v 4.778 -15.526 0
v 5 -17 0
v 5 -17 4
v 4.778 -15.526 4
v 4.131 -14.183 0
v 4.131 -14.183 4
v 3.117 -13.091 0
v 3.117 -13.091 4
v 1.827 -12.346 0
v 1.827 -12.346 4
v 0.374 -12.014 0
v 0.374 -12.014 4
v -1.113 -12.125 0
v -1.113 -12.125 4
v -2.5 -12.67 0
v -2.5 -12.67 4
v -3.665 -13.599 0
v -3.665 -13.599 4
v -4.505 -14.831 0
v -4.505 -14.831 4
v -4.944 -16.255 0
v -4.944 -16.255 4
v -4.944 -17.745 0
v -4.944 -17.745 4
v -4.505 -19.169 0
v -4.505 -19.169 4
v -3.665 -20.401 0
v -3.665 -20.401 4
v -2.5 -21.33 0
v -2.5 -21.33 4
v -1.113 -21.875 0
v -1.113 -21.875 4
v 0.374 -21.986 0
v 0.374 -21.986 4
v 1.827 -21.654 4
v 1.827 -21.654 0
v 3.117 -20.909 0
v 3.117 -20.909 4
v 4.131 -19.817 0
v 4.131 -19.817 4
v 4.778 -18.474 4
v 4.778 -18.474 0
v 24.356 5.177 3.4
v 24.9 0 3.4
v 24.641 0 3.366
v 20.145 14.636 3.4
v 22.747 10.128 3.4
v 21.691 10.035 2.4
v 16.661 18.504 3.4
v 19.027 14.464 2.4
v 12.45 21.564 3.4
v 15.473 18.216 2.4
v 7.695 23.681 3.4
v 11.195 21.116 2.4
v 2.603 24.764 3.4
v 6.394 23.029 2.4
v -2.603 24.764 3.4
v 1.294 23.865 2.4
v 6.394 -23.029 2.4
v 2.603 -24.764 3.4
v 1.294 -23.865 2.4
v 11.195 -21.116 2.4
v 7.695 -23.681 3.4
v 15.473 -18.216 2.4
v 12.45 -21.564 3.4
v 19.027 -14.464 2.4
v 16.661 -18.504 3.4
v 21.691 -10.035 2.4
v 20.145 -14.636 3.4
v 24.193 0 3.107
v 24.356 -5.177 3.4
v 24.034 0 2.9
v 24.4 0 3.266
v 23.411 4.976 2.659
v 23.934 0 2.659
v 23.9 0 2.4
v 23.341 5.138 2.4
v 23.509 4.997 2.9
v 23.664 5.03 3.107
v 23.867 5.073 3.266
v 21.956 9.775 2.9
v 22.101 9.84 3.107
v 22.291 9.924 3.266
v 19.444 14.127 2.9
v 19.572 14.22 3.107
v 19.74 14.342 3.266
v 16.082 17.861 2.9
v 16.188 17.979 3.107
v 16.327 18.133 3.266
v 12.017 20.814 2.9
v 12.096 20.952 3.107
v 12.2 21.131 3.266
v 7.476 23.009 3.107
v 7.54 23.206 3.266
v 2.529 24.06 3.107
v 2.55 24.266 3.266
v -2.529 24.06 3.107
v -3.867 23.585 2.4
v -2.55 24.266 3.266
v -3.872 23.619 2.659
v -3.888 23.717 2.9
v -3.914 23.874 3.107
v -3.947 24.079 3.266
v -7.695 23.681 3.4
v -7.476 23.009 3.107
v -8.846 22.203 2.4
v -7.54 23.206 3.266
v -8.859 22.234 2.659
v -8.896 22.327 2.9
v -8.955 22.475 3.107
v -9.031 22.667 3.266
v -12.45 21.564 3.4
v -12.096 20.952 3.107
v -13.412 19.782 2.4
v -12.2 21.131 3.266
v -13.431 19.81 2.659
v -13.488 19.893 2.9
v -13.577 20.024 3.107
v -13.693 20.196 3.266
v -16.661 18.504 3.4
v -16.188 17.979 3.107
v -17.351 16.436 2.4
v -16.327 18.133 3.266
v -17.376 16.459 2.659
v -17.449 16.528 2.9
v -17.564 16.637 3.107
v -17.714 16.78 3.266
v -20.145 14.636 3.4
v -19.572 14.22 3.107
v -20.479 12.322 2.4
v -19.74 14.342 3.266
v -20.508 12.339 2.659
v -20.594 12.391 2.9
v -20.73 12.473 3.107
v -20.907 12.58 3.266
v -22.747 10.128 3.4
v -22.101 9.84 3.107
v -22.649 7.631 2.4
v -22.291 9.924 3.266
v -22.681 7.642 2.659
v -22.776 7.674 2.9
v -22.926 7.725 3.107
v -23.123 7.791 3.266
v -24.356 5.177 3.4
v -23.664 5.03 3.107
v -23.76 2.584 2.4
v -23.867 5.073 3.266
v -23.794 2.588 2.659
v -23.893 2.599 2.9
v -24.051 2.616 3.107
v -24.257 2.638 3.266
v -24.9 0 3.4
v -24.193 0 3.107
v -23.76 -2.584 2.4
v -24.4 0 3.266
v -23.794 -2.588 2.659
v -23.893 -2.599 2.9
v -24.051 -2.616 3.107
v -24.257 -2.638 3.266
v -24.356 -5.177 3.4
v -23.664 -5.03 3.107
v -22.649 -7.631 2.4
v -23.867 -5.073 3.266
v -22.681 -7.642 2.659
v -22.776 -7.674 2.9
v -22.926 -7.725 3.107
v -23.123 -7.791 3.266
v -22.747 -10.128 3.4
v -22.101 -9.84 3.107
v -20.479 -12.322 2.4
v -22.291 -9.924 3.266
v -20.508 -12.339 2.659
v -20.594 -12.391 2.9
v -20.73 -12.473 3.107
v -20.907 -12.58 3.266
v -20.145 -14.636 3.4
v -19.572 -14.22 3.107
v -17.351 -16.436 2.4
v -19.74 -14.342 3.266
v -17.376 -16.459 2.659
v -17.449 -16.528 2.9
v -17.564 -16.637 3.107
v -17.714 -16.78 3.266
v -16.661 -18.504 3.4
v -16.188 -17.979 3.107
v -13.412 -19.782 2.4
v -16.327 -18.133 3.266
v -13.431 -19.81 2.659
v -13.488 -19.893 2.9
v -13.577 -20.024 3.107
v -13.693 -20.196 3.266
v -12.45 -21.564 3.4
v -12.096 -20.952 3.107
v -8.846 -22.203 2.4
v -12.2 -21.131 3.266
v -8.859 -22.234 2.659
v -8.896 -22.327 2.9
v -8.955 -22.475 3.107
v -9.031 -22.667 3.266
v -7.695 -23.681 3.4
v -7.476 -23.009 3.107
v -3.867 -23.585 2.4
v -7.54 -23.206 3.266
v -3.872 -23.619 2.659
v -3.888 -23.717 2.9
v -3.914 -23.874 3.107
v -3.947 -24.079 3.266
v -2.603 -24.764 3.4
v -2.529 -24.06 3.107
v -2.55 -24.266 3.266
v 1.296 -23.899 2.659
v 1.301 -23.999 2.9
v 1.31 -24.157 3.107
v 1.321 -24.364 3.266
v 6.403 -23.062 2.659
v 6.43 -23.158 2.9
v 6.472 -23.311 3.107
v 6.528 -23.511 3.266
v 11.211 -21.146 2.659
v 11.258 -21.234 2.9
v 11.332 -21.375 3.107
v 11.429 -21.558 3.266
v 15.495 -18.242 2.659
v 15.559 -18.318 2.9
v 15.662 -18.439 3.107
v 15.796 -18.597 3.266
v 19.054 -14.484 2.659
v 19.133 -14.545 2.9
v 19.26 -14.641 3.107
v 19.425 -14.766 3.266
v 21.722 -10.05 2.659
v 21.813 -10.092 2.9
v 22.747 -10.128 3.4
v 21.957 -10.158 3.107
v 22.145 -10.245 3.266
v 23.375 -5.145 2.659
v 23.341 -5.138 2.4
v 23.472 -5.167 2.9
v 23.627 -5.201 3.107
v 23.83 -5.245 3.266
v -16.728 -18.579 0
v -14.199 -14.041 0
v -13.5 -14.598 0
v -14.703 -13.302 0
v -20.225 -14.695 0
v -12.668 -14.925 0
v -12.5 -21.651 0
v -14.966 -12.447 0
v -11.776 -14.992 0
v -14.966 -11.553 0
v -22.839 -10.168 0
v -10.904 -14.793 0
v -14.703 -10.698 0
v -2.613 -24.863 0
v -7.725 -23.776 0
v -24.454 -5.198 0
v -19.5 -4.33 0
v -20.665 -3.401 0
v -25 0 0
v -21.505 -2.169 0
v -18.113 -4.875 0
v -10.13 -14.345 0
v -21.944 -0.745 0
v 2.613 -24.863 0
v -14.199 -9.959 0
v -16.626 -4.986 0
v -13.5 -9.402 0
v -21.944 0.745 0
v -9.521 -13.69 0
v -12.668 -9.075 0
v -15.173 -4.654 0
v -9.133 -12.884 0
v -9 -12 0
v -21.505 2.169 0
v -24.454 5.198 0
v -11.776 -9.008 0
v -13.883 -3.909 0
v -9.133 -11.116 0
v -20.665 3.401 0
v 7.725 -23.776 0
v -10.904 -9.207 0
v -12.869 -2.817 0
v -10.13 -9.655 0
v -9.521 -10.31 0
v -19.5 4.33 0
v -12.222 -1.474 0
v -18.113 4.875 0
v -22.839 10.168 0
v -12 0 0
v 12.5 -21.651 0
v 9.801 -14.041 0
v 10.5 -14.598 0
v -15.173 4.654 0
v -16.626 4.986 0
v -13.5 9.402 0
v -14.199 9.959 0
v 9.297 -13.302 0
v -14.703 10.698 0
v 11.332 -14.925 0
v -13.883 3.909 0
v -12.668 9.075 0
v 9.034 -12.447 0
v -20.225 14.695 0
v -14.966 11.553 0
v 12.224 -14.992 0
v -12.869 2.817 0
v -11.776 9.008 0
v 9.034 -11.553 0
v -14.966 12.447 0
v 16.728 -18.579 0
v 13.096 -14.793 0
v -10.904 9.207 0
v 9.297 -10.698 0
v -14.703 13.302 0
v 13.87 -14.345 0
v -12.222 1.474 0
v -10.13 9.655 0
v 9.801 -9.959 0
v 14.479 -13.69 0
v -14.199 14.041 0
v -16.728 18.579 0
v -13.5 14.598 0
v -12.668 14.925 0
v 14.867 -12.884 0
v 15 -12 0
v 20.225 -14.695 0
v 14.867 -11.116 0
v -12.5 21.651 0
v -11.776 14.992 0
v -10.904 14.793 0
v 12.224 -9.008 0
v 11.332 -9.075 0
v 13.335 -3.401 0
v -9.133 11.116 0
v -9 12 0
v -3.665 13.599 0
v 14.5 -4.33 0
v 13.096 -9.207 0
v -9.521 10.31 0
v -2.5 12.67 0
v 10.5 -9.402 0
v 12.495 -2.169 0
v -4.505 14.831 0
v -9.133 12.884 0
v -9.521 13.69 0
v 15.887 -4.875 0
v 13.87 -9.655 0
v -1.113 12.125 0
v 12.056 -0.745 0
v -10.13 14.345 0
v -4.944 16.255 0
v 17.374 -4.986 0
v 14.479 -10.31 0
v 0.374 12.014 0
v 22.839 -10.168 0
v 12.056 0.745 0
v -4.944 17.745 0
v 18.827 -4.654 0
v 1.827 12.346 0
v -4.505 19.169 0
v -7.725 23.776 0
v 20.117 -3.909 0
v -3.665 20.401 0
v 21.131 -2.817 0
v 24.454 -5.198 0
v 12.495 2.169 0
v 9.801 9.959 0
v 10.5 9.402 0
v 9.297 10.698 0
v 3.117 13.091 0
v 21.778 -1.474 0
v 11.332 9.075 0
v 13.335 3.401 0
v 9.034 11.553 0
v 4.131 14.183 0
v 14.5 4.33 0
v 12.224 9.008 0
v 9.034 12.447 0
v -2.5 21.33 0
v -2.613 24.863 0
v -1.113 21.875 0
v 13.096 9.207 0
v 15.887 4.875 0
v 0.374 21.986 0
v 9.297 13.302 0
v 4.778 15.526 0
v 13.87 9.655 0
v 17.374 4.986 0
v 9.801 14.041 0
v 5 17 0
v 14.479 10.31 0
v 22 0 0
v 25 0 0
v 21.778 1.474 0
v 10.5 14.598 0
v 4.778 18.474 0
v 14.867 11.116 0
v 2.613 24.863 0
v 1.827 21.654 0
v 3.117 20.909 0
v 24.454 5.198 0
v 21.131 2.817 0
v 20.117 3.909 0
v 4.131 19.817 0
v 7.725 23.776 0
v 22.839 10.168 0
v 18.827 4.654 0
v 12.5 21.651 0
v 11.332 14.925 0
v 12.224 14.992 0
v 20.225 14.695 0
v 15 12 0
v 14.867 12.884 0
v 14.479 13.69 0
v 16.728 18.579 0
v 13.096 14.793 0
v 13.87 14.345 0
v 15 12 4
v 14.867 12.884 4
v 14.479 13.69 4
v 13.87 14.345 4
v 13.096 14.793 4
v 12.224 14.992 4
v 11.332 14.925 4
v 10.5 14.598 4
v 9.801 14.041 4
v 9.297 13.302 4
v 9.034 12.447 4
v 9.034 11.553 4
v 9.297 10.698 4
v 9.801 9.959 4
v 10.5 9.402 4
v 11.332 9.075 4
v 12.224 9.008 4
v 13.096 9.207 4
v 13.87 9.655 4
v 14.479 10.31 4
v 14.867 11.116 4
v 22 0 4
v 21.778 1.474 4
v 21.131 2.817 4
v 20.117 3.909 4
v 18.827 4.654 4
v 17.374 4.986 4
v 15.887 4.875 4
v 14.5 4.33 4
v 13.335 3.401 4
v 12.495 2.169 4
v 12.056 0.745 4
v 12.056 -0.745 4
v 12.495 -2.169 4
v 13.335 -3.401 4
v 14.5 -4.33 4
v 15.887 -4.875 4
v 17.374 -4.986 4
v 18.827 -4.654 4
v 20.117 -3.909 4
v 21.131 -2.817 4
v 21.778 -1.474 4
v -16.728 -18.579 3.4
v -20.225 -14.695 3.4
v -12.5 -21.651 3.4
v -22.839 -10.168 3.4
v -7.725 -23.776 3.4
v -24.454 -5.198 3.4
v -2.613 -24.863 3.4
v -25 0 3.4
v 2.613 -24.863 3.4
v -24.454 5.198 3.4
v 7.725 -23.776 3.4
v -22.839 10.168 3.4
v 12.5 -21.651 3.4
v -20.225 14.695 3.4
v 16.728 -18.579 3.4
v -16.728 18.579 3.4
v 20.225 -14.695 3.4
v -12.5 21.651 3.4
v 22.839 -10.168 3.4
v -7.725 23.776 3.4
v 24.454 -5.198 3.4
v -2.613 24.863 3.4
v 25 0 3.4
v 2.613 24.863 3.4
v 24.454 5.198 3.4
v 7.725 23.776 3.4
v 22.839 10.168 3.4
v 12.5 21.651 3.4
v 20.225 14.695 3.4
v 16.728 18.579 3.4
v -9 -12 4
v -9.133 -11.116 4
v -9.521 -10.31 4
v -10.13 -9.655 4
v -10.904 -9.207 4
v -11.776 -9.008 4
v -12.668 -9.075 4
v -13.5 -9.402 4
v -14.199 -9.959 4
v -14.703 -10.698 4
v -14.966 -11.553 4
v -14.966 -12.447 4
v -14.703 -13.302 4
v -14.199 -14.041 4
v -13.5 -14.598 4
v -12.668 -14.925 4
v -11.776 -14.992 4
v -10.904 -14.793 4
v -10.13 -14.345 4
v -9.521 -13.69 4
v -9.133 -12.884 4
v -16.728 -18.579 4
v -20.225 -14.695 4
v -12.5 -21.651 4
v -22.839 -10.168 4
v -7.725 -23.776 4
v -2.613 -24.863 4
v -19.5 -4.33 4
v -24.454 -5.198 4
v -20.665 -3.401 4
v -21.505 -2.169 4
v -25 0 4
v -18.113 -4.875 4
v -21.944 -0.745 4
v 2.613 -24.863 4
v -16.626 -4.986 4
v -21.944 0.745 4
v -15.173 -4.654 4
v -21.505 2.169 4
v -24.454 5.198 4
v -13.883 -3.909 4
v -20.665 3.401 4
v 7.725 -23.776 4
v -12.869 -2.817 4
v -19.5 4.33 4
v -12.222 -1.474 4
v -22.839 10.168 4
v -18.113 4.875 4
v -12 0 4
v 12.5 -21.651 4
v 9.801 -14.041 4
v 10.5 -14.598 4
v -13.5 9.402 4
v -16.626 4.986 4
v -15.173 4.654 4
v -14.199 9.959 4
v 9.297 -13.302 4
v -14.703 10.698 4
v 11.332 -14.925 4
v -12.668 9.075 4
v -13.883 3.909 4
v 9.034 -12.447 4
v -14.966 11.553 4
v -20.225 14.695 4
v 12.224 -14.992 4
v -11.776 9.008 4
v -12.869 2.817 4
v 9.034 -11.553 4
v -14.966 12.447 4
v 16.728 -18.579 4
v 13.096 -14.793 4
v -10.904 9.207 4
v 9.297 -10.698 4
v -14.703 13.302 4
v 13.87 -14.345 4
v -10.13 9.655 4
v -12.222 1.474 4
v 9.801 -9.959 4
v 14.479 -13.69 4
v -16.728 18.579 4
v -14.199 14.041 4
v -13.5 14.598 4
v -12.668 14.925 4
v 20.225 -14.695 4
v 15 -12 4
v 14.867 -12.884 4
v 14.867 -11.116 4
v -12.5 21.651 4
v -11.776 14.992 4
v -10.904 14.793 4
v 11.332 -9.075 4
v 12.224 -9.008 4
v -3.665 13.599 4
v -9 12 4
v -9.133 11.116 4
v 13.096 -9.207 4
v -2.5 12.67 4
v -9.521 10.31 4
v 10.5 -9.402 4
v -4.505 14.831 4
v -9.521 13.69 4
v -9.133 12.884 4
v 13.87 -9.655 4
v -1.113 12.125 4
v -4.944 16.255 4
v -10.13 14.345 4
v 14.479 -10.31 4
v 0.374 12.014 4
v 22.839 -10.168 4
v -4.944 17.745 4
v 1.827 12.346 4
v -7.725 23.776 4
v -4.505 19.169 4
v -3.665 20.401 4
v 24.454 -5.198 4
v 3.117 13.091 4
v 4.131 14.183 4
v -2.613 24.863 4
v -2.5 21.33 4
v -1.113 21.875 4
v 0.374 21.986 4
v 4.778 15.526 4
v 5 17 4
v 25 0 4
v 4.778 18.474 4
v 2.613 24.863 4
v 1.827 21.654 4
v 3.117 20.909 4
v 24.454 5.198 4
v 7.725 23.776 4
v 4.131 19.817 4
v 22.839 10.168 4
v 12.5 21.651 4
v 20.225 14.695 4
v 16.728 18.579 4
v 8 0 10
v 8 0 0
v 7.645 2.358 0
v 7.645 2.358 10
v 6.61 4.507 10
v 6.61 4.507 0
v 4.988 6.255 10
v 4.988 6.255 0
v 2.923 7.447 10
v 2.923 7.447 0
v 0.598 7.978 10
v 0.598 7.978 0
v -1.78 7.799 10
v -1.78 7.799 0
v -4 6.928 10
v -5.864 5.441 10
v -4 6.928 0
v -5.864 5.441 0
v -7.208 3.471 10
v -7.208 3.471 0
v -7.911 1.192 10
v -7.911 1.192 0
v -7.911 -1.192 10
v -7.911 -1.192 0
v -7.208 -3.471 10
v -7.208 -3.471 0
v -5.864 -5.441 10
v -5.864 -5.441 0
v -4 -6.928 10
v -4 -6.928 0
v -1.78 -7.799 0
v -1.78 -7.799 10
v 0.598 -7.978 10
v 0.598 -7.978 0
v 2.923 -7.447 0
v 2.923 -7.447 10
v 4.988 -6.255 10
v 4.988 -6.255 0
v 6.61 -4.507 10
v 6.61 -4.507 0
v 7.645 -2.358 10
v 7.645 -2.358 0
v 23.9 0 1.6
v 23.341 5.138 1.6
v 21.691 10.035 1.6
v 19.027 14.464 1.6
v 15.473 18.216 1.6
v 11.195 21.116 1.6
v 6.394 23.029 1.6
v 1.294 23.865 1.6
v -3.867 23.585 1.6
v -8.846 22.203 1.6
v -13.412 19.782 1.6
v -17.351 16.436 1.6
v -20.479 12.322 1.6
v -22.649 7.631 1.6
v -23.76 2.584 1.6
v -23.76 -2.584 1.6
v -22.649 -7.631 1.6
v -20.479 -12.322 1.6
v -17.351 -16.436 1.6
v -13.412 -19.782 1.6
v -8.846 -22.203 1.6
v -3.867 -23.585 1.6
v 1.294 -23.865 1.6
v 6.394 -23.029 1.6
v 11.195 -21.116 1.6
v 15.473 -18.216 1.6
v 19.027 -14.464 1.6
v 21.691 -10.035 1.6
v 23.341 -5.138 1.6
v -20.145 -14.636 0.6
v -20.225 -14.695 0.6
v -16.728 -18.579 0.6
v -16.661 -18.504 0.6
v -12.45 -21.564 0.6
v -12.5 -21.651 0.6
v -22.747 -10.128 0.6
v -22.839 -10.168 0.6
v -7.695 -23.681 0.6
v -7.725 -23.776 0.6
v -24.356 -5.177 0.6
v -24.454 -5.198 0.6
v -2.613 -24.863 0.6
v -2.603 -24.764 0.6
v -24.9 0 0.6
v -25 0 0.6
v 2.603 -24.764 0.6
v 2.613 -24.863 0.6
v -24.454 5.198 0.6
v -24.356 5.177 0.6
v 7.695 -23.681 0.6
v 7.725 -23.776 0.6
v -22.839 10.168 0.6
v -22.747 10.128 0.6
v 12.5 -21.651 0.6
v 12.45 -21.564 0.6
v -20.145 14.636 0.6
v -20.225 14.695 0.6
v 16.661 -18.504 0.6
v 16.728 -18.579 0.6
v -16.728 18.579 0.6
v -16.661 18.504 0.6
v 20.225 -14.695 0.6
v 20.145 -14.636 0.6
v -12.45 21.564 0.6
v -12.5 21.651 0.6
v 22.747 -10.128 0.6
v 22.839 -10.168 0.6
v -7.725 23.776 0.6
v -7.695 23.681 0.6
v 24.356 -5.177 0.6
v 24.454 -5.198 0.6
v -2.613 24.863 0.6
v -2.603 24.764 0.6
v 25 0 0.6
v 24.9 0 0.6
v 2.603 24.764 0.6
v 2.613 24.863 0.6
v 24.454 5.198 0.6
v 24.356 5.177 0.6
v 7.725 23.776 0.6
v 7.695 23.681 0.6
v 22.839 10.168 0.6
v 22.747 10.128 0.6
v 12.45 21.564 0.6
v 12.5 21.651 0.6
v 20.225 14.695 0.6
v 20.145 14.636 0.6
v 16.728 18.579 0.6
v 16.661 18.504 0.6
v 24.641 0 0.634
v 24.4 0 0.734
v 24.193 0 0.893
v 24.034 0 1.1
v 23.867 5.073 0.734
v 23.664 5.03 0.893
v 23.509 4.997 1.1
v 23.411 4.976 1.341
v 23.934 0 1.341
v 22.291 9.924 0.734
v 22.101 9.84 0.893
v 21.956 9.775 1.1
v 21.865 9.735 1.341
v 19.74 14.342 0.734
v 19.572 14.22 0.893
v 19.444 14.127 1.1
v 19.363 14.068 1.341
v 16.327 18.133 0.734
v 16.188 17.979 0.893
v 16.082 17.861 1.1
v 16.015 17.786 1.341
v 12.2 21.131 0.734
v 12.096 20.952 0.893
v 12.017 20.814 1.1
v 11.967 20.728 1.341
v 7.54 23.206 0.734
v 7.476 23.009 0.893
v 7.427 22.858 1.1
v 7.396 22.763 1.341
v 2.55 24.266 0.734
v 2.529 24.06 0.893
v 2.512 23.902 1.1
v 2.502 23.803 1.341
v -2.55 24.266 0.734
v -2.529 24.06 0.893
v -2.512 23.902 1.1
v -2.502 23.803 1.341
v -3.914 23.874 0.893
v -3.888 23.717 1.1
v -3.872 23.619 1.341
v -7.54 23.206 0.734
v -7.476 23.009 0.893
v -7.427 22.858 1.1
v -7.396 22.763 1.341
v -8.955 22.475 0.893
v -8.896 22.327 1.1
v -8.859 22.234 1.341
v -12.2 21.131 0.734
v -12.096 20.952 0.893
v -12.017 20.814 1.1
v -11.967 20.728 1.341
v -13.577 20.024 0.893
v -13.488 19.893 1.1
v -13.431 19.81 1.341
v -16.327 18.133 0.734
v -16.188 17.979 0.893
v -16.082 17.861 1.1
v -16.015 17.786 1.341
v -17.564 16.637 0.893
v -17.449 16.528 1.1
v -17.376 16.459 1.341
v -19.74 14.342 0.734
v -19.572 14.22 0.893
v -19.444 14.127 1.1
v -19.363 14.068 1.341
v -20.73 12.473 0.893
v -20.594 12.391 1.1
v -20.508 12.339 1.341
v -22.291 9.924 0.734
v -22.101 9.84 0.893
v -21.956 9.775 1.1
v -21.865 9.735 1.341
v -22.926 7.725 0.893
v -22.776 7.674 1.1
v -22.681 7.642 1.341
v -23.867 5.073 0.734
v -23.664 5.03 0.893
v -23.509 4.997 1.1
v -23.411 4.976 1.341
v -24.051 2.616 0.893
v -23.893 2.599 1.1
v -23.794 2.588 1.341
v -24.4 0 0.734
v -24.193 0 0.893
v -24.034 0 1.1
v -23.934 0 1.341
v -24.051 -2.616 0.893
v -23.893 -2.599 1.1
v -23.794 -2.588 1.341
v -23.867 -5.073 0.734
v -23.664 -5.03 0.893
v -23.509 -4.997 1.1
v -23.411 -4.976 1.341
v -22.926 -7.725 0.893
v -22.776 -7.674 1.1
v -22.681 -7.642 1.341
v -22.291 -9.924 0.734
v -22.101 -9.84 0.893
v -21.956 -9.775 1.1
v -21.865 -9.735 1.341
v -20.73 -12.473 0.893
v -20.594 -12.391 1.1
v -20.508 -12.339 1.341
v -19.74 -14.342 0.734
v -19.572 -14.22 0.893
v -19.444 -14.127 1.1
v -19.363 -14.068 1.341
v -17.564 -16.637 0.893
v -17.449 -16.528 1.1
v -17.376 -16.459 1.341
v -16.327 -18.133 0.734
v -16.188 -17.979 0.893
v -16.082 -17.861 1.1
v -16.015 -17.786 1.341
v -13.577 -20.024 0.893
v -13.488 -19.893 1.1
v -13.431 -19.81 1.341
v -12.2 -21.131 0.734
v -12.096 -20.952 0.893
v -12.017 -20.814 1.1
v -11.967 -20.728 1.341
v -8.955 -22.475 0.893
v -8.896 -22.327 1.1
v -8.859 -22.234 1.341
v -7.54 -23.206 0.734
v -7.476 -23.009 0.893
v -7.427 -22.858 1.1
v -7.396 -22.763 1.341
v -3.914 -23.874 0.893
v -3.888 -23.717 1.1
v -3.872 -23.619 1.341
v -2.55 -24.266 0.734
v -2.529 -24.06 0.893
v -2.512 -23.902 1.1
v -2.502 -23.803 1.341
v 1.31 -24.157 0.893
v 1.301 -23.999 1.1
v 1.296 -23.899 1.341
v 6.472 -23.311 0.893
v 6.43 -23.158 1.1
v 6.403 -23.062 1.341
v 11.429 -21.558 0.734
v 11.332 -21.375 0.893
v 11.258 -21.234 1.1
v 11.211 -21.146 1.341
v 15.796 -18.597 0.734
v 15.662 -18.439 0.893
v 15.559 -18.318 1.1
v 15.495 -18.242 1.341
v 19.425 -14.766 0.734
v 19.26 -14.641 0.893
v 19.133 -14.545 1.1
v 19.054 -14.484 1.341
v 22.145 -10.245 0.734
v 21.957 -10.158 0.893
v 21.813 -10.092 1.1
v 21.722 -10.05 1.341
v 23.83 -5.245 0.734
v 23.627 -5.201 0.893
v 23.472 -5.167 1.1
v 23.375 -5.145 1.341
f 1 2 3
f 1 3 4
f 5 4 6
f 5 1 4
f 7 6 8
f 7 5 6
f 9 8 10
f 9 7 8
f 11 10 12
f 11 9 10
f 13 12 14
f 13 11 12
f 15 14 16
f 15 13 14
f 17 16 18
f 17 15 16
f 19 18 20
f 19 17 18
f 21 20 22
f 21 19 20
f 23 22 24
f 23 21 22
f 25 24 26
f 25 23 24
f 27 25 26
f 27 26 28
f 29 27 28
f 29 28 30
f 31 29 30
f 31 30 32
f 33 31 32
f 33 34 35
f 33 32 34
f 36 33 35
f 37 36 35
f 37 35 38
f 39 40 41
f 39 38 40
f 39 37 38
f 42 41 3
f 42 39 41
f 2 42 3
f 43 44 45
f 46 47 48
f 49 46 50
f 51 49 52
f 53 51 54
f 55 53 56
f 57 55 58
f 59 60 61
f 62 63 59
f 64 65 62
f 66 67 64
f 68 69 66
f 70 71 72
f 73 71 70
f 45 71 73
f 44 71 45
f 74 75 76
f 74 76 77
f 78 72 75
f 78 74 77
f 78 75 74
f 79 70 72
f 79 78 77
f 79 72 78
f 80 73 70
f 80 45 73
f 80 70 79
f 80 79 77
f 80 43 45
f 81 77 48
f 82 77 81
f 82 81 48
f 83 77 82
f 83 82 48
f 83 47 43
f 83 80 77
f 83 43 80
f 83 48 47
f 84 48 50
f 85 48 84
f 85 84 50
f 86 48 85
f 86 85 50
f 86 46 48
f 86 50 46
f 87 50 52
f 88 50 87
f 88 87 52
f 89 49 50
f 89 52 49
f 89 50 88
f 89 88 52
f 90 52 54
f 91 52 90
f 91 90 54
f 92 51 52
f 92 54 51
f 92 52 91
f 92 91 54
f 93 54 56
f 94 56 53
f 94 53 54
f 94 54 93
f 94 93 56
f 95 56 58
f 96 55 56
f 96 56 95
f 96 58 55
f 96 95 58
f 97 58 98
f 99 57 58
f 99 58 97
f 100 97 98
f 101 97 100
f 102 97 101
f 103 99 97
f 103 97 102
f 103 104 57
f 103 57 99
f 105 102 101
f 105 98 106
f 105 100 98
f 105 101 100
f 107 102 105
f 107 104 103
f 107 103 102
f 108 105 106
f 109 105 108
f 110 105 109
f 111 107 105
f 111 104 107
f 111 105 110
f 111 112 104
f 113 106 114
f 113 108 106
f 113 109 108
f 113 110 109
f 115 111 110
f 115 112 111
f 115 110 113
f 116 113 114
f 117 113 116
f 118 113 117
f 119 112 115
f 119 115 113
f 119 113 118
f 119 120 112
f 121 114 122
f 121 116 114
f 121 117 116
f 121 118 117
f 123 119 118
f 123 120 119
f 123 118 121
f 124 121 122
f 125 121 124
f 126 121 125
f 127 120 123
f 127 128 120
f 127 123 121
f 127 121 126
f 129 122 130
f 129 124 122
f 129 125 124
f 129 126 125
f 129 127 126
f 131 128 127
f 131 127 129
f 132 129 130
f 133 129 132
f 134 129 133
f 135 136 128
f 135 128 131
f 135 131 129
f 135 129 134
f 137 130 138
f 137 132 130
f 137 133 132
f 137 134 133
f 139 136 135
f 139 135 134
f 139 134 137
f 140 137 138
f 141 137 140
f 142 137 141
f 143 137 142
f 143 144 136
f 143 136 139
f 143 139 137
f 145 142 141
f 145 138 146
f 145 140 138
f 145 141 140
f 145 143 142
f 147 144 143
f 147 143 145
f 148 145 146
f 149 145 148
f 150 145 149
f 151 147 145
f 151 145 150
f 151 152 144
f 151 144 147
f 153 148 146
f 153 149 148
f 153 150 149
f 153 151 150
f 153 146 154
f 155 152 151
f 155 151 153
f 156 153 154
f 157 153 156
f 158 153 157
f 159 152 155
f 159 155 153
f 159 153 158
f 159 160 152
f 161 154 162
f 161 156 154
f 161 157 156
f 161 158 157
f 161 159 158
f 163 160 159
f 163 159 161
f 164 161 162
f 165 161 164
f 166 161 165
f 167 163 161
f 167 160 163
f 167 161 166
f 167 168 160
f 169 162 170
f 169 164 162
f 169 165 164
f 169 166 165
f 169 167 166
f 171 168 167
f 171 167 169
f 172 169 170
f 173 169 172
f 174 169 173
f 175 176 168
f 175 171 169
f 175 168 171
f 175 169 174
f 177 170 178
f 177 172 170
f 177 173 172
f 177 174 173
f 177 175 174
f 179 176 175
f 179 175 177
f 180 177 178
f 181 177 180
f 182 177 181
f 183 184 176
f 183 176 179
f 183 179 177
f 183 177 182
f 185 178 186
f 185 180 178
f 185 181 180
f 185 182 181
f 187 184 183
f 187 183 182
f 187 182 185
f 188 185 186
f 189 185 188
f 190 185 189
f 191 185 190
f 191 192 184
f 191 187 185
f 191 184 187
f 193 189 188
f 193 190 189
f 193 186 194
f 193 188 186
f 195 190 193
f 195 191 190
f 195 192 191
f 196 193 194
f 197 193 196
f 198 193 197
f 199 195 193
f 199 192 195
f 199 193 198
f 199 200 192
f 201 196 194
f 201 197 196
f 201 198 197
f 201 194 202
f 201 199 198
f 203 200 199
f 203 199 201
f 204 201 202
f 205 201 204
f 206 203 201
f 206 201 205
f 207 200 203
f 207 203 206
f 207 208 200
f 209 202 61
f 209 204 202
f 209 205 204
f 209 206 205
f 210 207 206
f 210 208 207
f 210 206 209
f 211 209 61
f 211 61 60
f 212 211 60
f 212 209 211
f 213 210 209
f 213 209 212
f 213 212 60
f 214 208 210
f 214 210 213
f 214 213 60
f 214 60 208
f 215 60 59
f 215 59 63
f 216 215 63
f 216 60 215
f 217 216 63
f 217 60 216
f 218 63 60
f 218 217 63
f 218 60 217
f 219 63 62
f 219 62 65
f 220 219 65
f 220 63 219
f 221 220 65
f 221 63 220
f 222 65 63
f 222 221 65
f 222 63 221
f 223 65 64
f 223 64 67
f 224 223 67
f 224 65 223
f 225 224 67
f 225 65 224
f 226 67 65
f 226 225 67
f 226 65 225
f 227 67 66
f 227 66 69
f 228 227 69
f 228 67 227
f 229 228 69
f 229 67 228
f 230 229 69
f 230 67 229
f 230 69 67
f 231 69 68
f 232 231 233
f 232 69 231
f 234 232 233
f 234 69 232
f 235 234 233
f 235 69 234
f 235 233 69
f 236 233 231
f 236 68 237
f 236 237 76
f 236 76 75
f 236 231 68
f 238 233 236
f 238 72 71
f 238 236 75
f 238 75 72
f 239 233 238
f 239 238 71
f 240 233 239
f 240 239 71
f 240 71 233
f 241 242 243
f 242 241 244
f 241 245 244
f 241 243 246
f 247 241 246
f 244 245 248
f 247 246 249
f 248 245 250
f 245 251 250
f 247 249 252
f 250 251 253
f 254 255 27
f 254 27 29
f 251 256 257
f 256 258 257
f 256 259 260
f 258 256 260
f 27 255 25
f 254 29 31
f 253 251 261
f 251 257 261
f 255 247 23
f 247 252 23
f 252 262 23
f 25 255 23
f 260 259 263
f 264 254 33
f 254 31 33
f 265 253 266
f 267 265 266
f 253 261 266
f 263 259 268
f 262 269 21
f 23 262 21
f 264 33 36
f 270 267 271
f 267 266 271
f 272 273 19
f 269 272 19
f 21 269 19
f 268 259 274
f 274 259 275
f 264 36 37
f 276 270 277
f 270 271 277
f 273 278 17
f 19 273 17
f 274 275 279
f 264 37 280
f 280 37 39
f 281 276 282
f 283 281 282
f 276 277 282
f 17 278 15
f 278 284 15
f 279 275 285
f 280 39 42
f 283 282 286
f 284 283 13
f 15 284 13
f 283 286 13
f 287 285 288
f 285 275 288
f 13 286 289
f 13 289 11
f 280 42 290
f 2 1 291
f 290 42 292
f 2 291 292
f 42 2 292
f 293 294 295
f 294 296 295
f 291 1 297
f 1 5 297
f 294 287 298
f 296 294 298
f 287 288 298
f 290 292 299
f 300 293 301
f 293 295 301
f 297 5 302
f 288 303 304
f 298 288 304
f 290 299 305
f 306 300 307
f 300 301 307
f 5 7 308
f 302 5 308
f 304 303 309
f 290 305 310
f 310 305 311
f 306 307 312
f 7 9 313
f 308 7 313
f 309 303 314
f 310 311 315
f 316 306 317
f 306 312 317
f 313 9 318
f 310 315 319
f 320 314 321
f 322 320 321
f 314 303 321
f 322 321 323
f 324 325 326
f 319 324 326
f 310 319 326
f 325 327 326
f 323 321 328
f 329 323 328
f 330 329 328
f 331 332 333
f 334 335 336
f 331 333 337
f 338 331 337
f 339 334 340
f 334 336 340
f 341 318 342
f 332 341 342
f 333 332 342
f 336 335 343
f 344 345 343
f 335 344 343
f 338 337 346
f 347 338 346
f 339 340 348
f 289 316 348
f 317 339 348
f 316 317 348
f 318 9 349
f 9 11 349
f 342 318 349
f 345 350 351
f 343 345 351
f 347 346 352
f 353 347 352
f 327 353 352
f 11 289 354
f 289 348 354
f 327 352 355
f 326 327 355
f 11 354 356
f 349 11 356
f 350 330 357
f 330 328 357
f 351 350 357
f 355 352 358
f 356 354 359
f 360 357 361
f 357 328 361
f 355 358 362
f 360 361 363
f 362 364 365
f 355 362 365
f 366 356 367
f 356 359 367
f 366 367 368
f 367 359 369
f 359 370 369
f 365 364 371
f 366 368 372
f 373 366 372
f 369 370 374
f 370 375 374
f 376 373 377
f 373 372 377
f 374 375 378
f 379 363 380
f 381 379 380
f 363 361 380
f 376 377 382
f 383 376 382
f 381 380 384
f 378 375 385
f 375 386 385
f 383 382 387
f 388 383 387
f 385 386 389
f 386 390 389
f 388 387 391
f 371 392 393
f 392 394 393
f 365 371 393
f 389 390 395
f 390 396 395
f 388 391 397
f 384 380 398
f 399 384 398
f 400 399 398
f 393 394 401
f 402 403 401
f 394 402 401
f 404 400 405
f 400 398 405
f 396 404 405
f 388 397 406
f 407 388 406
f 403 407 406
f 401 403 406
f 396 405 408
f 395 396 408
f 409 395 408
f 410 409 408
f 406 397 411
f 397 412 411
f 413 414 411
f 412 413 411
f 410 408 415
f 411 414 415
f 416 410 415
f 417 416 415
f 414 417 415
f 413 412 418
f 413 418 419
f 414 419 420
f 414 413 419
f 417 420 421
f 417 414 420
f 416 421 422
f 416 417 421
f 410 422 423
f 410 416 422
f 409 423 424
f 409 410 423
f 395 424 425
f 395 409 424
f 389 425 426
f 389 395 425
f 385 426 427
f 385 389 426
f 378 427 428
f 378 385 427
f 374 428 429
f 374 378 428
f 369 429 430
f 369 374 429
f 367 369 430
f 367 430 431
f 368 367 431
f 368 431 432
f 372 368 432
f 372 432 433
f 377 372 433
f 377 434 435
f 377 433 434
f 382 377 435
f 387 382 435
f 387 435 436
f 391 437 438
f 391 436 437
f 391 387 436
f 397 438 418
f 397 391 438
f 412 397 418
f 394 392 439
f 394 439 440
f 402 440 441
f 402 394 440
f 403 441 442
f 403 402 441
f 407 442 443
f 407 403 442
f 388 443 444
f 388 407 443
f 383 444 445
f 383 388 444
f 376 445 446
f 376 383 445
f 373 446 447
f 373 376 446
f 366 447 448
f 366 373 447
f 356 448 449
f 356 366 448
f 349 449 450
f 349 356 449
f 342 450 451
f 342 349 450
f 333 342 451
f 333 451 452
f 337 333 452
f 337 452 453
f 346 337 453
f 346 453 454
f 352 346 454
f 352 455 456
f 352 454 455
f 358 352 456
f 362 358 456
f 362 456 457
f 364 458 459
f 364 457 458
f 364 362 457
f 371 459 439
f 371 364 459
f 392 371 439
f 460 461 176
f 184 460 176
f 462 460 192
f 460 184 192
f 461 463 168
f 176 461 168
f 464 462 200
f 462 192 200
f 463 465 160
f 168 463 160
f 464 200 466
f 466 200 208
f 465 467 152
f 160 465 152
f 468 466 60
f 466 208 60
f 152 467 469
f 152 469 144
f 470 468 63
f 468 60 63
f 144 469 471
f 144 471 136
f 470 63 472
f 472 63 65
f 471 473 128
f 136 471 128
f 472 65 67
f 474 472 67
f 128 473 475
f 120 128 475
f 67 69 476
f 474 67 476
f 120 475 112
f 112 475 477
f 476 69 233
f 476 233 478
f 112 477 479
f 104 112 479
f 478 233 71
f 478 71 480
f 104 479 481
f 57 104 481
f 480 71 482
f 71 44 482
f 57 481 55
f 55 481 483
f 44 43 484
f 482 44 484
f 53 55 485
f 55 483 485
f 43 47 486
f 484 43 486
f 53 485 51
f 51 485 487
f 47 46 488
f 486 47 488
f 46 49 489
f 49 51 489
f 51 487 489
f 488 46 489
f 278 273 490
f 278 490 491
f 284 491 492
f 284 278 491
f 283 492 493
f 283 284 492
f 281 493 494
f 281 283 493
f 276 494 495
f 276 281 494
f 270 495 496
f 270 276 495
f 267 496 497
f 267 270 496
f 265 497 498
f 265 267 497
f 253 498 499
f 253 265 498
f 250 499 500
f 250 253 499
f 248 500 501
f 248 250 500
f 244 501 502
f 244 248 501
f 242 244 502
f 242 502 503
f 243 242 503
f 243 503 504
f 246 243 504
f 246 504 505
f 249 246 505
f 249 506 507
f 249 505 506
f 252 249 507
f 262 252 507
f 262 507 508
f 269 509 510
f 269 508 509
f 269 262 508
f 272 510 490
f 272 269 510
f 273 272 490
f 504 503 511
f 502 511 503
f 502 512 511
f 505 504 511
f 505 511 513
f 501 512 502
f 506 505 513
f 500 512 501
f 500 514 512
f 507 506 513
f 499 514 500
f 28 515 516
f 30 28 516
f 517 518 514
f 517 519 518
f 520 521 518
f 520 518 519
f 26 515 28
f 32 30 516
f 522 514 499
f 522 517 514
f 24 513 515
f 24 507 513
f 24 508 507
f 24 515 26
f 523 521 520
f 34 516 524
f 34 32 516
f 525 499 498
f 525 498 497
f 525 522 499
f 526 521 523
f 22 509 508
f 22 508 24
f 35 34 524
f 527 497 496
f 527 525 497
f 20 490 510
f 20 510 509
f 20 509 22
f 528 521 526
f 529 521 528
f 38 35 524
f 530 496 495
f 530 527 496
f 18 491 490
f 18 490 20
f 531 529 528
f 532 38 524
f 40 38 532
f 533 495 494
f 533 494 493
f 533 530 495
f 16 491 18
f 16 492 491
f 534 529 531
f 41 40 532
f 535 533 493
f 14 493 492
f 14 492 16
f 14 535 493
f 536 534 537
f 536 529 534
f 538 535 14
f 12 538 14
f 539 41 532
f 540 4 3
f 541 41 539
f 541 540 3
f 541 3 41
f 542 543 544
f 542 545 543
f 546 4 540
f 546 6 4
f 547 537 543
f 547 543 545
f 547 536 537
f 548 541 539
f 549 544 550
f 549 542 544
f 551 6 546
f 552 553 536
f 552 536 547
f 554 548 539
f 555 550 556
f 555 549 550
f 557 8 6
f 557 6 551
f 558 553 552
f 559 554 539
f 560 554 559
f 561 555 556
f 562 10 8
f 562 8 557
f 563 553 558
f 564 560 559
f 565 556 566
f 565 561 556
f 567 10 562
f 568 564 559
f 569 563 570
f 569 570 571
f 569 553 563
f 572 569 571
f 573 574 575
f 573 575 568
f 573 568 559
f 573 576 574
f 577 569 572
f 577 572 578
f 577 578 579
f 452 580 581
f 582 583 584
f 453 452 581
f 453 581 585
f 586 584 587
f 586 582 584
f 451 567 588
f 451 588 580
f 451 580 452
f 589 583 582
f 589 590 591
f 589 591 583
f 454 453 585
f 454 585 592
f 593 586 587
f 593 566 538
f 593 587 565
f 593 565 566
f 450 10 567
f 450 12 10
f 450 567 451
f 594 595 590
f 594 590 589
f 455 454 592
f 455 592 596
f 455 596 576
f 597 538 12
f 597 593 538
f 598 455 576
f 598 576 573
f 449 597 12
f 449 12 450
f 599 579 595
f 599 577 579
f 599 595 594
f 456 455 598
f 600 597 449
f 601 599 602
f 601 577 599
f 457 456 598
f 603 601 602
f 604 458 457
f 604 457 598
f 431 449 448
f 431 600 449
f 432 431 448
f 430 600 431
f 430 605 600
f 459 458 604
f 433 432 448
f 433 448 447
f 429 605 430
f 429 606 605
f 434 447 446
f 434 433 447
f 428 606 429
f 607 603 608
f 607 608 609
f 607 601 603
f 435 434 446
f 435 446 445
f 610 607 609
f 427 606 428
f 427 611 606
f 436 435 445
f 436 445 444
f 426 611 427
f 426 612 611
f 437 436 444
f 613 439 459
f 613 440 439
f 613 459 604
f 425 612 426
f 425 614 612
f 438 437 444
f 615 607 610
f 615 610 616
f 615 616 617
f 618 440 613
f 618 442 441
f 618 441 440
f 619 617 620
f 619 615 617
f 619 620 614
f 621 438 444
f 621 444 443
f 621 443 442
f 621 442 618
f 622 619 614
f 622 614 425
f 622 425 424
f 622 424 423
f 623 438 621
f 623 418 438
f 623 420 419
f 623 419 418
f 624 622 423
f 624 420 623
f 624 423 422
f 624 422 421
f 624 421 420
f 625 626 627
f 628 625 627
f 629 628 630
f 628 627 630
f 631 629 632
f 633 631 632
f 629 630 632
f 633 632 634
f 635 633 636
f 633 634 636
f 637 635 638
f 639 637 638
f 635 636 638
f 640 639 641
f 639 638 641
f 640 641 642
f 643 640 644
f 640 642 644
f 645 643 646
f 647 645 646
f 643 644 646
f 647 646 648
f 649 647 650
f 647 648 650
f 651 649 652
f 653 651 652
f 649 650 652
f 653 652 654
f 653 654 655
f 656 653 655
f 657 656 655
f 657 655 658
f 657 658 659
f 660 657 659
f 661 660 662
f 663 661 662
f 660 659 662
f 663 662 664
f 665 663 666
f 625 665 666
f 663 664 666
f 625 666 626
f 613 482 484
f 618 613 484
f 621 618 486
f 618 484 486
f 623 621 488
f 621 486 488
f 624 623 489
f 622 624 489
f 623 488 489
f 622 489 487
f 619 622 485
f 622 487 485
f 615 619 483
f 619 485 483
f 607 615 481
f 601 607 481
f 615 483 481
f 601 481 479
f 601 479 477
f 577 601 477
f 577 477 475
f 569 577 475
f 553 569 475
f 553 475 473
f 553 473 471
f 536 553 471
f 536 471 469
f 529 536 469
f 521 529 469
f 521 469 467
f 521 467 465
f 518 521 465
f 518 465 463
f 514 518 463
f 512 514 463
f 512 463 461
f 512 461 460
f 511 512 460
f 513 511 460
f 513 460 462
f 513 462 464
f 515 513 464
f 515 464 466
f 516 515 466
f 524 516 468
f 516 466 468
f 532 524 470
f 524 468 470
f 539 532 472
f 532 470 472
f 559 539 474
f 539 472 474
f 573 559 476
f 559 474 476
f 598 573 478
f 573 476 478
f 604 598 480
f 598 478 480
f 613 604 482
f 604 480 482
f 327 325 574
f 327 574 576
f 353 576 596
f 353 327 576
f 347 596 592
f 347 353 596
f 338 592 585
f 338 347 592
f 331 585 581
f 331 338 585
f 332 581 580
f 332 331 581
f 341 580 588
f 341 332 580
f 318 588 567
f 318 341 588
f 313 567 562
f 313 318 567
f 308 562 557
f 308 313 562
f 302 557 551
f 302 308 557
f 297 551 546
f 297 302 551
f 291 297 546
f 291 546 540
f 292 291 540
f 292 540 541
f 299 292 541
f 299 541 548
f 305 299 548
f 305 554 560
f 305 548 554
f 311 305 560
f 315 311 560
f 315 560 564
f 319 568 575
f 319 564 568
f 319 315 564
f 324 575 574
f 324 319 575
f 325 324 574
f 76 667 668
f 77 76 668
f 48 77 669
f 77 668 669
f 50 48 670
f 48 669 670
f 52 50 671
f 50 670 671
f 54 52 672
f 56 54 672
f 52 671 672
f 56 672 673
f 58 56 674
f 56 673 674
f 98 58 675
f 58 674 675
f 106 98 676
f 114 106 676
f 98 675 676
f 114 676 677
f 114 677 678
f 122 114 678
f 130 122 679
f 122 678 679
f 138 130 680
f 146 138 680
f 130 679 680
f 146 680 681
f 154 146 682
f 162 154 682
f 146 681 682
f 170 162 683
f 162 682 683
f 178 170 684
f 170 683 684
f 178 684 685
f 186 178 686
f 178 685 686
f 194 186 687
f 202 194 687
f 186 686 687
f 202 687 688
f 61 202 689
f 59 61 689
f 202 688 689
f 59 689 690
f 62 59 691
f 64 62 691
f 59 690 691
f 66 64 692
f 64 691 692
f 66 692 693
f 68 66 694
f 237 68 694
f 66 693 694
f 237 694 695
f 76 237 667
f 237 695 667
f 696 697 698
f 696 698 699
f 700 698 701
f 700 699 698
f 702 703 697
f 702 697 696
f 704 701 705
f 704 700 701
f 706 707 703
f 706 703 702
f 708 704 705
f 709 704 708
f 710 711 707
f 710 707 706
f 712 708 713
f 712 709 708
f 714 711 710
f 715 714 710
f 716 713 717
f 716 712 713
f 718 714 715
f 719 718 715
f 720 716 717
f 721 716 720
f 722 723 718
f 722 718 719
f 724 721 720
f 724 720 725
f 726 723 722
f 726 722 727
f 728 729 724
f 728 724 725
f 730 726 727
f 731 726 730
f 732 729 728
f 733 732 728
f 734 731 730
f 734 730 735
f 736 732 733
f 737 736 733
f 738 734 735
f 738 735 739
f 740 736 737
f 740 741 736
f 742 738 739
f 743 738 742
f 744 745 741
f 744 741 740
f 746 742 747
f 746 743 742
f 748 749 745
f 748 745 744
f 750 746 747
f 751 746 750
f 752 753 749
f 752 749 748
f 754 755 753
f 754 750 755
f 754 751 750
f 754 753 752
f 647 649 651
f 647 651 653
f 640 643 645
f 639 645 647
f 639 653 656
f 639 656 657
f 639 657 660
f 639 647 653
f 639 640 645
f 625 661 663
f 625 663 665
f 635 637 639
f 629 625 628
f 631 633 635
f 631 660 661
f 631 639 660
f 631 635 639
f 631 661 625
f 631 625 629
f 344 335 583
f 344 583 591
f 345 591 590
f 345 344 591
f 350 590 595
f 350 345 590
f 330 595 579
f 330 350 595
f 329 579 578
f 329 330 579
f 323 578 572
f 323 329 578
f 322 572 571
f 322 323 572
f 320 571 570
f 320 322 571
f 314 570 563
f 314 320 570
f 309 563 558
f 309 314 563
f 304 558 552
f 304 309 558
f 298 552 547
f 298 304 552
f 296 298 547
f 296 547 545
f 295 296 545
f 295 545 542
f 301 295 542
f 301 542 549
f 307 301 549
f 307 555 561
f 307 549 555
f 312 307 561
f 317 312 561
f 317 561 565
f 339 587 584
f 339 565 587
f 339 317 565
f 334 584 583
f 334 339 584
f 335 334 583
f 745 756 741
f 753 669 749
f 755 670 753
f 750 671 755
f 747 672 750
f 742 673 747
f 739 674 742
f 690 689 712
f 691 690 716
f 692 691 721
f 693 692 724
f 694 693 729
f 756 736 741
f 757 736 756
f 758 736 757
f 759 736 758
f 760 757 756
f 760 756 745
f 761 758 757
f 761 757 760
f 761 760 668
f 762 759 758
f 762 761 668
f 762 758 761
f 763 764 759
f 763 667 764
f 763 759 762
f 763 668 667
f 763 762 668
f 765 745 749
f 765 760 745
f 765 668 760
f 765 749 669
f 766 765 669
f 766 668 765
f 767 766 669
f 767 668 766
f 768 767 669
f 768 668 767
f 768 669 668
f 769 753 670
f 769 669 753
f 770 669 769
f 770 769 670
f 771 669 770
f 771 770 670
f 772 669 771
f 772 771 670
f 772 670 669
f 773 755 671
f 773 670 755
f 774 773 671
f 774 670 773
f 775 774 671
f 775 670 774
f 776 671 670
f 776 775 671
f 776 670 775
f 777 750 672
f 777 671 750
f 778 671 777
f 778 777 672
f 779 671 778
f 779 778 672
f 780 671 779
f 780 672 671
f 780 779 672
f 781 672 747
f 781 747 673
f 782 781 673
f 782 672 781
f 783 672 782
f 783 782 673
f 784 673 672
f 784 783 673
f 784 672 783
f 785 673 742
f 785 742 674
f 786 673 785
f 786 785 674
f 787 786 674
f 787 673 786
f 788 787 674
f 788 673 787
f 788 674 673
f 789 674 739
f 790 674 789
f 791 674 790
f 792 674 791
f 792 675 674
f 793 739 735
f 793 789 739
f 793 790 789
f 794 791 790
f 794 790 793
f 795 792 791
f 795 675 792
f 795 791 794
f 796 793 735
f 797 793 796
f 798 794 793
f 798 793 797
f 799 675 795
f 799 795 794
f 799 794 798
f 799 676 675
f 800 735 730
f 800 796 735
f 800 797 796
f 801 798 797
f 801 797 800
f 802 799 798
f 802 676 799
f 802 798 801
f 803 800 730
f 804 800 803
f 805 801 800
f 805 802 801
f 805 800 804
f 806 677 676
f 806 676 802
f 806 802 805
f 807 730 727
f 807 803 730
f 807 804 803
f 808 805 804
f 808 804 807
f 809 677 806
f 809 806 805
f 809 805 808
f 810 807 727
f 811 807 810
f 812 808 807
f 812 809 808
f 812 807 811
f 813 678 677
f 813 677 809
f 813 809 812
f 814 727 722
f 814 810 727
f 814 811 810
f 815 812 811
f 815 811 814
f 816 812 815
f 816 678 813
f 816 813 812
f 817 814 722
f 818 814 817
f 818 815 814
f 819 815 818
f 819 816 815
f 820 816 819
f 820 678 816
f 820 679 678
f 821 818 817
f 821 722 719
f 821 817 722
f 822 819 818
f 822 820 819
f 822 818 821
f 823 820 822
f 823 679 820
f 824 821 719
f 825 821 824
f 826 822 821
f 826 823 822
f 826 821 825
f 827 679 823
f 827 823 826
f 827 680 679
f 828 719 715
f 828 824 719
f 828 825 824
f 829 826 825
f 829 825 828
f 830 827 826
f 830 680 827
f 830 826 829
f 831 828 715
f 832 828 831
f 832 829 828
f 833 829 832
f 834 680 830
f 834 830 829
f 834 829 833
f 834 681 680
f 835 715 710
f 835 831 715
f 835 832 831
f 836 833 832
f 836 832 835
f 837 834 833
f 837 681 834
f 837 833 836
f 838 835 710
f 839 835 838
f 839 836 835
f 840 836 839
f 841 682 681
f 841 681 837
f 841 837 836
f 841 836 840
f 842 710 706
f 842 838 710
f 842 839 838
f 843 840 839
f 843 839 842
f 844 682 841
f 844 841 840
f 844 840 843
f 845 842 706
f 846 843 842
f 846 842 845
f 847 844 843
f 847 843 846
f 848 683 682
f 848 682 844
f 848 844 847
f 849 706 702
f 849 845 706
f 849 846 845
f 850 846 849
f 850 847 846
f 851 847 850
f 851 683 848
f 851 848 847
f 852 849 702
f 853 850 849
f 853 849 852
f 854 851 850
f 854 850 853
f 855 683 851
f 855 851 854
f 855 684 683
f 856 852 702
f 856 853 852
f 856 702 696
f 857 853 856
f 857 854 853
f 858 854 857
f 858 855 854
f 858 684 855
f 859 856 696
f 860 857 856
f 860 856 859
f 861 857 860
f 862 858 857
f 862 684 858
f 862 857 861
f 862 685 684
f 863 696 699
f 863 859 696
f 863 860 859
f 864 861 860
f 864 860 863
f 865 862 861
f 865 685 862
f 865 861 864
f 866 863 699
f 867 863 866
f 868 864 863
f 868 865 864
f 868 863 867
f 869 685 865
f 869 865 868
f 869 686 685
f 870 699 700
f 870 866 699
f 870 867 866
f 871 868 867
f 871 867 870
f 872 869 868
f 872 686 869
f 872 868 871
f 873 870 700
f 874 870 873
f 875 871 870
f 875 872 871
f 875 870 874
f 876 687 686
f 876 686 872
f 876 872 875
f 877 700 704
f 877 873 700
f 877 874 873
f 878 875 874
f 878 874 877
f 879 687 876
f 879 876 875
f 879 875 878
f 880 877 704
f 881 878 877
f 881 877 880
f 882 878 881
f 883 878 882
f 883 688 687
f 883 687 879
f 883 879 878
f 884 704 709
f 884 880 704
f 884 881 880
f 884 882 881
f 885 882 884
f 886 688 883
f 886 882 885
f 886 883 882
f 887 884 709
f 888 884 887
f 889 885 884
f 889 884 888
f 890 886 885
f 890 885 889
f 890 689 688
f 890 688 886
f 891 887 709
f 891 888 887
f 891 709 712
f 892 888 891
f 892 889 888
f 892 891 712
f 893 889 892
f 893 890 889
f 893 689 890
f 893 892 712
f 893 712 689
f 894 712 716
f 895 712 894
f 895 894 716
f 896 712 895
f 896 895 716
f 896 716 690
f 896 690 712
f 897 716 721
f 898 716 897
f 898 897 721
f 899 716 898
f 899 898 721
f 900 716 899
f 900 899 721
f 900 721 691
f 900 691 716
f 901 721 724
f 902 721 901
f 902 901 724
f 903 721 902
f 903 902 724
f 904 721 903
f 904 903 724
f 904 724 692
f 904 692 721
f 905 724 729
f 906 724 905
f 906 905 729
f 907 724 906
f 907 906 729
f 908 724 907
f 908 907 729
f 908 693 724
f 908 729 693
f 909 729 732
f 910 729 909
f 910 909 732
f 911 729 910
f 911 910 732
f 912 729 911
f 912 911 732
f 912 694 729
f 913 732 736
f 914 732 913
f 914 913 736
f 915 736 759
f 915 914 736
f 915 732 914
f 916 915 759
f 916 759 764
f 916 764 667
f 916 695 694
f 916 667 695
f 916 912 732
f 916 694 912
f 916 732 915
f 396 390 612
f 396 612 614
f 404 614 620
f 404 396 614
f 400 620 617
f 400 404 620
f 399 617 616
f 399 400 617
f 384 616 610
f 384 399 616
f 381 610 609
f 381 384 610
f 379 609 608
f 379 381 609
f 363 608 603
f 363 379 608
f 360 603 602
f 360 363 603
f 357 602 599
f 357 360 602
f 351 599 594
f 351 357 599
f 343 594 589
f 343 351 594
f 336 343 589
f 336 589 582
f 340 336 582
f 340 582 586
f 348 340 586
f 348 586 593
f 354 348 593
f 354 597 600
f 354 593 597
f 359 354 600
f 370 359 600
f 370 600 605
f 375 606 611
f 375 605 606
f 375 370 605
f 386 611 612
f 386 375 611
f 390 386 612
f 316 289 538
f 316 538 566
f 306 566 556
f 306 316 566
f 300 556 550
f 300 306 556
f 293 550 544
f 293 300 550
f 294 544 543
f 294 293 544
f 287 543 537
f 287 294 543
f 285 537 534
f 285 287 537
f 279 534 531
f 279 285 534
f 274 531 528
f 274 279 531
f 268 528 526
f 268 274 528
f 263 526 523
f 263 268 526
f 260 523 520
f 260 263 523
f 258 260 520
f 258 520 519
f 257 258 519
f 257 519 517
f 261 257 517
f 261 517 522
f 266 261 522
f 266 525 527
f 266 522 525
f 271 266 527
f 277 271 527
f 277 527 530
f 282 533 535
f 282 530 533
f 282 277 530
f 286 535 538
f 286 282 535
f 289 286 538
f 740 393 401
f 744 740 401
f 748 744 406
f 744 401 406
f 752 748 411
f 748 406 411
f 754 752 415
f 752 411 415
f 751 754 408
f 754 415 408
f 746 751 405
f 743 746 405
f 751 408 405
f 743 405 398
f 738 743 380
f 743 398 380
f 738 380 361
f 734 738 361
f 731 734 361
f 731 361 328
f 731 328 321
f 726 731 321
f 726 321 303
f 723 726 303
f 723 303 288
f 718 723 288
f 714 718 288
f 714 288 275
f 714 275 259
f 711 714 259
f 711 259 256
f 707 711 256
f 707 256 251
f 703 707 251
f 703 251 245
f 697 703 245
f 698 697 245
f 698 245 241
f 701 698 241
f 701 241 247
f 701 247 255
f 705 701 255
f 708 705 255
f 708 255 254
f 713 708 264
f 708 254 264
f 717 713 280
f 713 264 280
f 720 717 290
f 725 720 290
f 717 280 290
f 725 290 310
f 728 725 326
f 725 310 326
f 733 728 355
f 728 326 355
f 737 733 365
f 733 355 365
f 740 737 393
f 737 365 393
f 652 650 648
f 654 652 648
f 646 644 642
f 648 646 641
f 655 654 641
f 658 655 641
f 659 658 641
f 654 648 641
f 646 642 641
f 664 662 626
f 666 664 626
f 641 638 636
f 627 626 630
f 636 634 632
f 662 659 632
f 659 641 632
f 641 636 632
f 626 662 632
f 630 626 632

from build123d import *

# Parameters (mm, degrees)
CYLINDER001_R     = 8
CYLINDER001_DEPTH = 10
CYLINDER011_R     = 23.9
CYLINDER011_DEPTH = 2.8
CYLINDER010_R     = 25
CYLINDER010_DEPTH = 2.8
CYLINDER009_R     = 3
CYLINDER009_DEPTH = 10
CYLINDER002_R     = 5
CYLINDER002_DEPTH = 15
CYLINDER008_R     = 3
CYLINDER008_DEPTH = 10
CYLINDER005_R     = 5
CYLINDER005_DEPTH = 15
CYLINDER006_R     = 3
CYLINDER006_DEPTH = 10
CYLINDER003_R     = 5
CYLINDER003_DEPTH = 15
CYLINDER007_R     = 3
CYLINDER007_DEPTH = 10
CYLINDER004_R     = 5
CYLINDER004_DEPTH = 15
CYLINDER_R        = 25
CYLINDER_DEPTH    = 4
FILLET_R          = 1


with BuildPart() as cilindro001:
    # Cylinder001 → Cylinder001 (new body)
    with BuildSketch(Plane.XY):
        Circle(CYLINDER001_R)
    extrude(amount=CYLINDER001_DEPTH)


with BuildPart() as cilindro011:
    # Cylinder011 → Cylinder011 (new body)
    with BuildSketch(Plane.XY.offset(0.6)):
        Circle(CYLINDER011_R)
    extrude(amount=CYLINDER011_DEPTH)


with BuildPart() as cut008:
    # Cylinder010 → Cylinder010 (new body)
    with BuildSketch(Plane.XY.offset(0.6)):
        Circle(CYLINDER010_R)
    extrude(amount=CYLINDER010_DEPTH)

    # Cut008: cut Cilindro011
    add(cilindro011.part, mode=Mode.SUBTRACT)


with BuildPart() as cilindro009:
    # Cylinder009 → Cylinder009 (new body)
    with BuildSketch(Plane(origin=(12, 12, -2), x_dir=(1, 0, 0), z_dir=(0, 0, 1))):
        Circle(CYLINDER009_R)
    extrude(amount=CYLINDER009_DEPTH)


with BuildPart() as cilindro002:
    # Cylinder002 → Cylinder002 (new body)
    with BuildSketch(Plane(origin=(17, 0, -2), x_dir=(1, 0, 0), z_dir=(0, 0, 1))):
        Circle(CYLINDER002_R)
    extrude(amount=CYLINDER002_DEPTH)


with BuildPart() as cilindro008:
    # Cylinder008 → Cylinder008 (new body)
    with BuildSketch(Plane(origin=(12, -12, -2), x_dir=(1, 0, 0), z_dir=(0, 0, 1))):
        Circle(CYLINDER008_R)
    extrude(amount=CYLINDER008_DEPTH)


with BuildPart() as cilindro005:
    # Cylinder005 → Cylinder005 (new body)
    with BuildSketch(Plane(origin=(0, -17, -2), x_dir=(1, 0, 0), z_dir=(0, 0, 1))):
        Circle(CYLINDER005_R)
    extrude(amount=CYLINDER005_DEPTH)


with BuildPart() as cilindro006:
    # Cylinder006 → Cylinder006 (new body)
    with BuildSketch(Plane(origin=(-12, -12, -2), x_dir=(1, 0, 0), z_dir=(0, 0, 1))):
        Circle(CYLINDER006_R)
    extrude(amount=CYLINDER006_DEPTH)


with BuildPart() as cilindro003:
    # Cylinder003 → Cylinder003 (new body)
    with BuildSketch(Plane(origin=(-17, 0, -2), x_dir=(1, 0, 0), z_dir=(0, 0, 1))):
        Circle(CYLINDER003_R)
    extrude(amount=CYLINDER003_DEPTH)


with BuildPart() as cilindro007:
    # Cylinder007 → Cylinder007 (new body)
    with BuildSketch(Plane(origin=(-12, 12, -2), x_dir=(1, 0, 0), z_dir=(0, 0, 1))):
        Circle(CYLINDER007_R)
    extrude(amount=CYLINDER007_DEPTH)


with BuildPart() as cilindro004:
    # Cylinder004 → Cylinder004 (new body)
    with BuildSketch(Plane(origin=(0, 17, -2), x_dir=(1, 0, 0), z_dir=(0, 0, 1))):
        Circle(CYLINDER004_R)
    extrude(amount=CYLINDER004_DEPTH)


with BuildPart() as fillet_body:
    # Cylinder → Cylinder (new body)
    with BuildSketch(Plane.XY):
        Circle(CYLINDER_R)
    extrude(amount=CYLINDER_DEPTH)

    # Cut: cut Cilindro004
    add(cilindro004.part, mode=Mode.SUBTRACT)

    # Cut001: cut Cilindro007
    add(cilindro007.part, mode=Mode.SUBTRACT)

    # Cut002: cut Cilindro003
    add(cilindro003.part, mode=Mode.SUBTRACT)

    # Cut003: cut Cilindro006
    add(cilindro006.part, mode=Mode.SUBTRACT)

    # Cut004: cut Cilindro005
    add(cilindro005.part, mode=Mode.SUBTRACT)

    # Cut005: cut Cilindro008
    add(cilindro008.part, mode=Mode.SUBTRACT)

    # Cut006: cut Cilindro002
    add(cilindro002.part, mode=Mode.SUBTRACT)

    # Cut007: cut Cilindro009
    add(cilindro009.part, mode=Mode.SUBTRACT)

    # Cut009: cut Cut008
    add(cut008.part, mode=Mode.SUBTRACT)

    # Fillet
    fillet_edges = [fillet_body.edges().sort_by_distance(p)[0] for p in [
        (-23.9, 0, 3.4),
        (-23.9, 0, 0.6),
    ]]
    fillet(fillet_edges, radius=FILLET_R)


solid = Compound([cilindro001.part, fillet_body.part])
